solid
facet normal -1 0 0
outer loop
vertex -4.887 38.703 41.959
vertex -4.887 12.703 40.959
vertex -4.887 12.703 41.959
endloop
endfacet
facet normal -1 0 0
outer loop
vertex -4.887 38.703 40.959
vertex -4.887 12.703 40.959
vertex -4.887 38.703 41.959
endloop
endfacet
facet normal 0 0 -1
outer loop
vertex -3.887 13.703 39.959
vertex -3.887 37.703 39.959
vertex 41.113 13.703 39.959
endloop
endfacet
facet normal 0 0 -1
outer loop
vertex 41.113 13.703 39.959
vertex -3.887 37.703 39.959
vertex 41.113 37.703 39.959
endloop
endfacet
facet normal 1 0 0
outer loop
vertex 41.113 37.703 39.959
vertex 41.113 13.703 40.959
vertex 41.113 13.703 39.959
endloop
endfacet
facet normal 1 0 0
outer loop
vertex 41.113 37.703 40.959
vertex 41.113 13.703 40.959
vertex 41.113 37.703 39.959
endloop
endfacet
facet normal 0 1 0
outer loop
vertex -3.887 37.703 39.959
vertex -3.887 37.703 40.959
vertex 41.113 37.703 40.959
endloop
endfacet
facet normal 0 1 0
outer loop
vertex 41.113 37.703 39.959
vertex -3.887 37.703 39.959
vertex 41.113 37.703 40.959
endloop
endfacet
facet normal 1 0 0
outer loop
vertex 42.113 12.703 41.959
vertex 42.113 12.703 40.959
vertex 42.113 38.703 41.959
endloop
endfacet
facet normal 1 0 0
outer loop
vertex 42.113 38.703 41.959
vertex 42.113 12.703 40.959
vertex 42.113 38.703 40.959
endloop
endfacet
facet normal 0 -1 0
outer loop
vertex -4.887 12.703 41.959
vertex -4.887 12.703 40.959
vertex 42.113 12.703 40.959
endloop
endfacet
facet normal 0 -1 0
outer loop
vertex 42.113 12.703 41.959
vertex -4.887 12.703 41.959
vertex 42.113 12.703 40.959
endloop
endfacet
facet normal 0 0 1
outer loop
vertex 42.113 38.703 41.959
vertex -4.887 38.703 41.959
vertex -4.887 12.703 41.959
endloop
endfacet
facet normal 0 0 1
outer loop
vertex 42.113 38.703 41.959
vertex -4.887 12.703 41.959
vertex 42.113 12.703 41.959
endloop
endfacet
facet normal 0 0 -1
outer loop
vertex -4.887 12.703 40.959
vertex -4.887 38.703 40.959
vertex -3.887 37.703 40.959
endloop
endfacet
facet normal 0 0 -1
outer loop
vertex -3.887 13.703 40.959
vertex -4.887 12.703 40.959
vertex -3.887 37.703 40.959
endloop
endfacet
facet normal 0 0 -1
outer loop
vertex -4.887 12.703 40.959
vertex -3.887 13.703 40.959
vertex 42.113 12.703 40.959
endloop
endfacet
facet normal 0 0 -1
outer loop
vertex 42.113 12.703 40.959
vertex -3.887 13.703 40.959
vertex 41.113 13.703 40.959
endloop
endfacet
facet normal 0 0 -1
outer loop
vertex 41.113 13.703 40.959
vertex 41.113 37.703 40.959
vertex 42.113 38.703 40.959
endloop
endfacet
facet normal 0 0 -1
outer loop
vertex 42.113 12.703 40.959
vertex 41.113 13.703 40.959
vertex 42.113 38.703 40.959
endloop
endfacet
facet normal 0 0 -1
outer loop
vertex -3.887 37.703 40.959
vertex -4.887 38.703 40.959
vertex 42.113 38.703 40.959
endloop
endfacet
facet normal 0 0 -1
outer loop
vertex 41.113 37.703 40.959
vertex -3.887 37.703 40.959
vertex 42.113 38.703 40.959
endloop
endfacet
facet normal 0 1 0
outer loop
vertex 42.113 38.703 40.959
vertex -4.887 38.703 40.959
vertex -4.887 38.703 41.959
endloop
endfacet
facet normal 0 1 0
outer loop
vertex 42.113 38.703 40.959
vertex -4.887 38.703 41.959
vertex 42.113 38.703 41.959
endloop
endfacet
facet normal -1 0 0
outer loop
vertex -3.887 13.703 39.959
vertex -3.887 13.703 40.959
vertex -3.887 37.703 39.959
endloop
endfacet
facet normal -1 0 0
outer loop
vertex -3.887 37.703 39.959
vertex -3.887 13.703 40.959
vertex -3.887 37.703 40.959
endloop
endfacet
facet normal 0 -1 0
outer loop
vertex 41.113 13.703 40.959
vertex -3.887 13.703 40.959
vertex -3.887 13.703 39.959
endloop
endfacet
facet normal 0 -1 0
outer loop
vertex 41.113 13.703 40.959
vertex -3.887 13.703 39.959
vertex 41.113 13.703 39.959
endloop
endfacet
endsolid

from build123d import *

# Parameters (mm, degrees)
SKETCH1_W           = 45
SKETCH1_H           = 24
BOSS_EXTRUDE1_DEPTH = 1
SKETCH2_W           = 47
SKETCH2_H           = 26
BOSS_EXTRUDE2_DEPTH = 1


with BuildPart() as part:
    # Sketch1 → Boss-Extrude1 (new body)
    with BuildSketch(Plane.XY.offset(40.959042005)):
        with Locations((18.613098235, 25.703029386)):
            Rectangle(SKETCH1_W, SKETCH1_H)
    extrude(amount=-BOSS_EXTRUDE1_DEPTH)

    # Sketch2 → Boss-Extrude2 (add)
    with BuildSketch(Plane.XY.offset(40.959042005)):
        with Locations((18.613098235, 25.703029386)):
            Rectangle(SKETCH2_W, SKETCH2_H)
    extrude(amount=BOSS_EXTRUDE2_DEPTH)


solid = part.part
